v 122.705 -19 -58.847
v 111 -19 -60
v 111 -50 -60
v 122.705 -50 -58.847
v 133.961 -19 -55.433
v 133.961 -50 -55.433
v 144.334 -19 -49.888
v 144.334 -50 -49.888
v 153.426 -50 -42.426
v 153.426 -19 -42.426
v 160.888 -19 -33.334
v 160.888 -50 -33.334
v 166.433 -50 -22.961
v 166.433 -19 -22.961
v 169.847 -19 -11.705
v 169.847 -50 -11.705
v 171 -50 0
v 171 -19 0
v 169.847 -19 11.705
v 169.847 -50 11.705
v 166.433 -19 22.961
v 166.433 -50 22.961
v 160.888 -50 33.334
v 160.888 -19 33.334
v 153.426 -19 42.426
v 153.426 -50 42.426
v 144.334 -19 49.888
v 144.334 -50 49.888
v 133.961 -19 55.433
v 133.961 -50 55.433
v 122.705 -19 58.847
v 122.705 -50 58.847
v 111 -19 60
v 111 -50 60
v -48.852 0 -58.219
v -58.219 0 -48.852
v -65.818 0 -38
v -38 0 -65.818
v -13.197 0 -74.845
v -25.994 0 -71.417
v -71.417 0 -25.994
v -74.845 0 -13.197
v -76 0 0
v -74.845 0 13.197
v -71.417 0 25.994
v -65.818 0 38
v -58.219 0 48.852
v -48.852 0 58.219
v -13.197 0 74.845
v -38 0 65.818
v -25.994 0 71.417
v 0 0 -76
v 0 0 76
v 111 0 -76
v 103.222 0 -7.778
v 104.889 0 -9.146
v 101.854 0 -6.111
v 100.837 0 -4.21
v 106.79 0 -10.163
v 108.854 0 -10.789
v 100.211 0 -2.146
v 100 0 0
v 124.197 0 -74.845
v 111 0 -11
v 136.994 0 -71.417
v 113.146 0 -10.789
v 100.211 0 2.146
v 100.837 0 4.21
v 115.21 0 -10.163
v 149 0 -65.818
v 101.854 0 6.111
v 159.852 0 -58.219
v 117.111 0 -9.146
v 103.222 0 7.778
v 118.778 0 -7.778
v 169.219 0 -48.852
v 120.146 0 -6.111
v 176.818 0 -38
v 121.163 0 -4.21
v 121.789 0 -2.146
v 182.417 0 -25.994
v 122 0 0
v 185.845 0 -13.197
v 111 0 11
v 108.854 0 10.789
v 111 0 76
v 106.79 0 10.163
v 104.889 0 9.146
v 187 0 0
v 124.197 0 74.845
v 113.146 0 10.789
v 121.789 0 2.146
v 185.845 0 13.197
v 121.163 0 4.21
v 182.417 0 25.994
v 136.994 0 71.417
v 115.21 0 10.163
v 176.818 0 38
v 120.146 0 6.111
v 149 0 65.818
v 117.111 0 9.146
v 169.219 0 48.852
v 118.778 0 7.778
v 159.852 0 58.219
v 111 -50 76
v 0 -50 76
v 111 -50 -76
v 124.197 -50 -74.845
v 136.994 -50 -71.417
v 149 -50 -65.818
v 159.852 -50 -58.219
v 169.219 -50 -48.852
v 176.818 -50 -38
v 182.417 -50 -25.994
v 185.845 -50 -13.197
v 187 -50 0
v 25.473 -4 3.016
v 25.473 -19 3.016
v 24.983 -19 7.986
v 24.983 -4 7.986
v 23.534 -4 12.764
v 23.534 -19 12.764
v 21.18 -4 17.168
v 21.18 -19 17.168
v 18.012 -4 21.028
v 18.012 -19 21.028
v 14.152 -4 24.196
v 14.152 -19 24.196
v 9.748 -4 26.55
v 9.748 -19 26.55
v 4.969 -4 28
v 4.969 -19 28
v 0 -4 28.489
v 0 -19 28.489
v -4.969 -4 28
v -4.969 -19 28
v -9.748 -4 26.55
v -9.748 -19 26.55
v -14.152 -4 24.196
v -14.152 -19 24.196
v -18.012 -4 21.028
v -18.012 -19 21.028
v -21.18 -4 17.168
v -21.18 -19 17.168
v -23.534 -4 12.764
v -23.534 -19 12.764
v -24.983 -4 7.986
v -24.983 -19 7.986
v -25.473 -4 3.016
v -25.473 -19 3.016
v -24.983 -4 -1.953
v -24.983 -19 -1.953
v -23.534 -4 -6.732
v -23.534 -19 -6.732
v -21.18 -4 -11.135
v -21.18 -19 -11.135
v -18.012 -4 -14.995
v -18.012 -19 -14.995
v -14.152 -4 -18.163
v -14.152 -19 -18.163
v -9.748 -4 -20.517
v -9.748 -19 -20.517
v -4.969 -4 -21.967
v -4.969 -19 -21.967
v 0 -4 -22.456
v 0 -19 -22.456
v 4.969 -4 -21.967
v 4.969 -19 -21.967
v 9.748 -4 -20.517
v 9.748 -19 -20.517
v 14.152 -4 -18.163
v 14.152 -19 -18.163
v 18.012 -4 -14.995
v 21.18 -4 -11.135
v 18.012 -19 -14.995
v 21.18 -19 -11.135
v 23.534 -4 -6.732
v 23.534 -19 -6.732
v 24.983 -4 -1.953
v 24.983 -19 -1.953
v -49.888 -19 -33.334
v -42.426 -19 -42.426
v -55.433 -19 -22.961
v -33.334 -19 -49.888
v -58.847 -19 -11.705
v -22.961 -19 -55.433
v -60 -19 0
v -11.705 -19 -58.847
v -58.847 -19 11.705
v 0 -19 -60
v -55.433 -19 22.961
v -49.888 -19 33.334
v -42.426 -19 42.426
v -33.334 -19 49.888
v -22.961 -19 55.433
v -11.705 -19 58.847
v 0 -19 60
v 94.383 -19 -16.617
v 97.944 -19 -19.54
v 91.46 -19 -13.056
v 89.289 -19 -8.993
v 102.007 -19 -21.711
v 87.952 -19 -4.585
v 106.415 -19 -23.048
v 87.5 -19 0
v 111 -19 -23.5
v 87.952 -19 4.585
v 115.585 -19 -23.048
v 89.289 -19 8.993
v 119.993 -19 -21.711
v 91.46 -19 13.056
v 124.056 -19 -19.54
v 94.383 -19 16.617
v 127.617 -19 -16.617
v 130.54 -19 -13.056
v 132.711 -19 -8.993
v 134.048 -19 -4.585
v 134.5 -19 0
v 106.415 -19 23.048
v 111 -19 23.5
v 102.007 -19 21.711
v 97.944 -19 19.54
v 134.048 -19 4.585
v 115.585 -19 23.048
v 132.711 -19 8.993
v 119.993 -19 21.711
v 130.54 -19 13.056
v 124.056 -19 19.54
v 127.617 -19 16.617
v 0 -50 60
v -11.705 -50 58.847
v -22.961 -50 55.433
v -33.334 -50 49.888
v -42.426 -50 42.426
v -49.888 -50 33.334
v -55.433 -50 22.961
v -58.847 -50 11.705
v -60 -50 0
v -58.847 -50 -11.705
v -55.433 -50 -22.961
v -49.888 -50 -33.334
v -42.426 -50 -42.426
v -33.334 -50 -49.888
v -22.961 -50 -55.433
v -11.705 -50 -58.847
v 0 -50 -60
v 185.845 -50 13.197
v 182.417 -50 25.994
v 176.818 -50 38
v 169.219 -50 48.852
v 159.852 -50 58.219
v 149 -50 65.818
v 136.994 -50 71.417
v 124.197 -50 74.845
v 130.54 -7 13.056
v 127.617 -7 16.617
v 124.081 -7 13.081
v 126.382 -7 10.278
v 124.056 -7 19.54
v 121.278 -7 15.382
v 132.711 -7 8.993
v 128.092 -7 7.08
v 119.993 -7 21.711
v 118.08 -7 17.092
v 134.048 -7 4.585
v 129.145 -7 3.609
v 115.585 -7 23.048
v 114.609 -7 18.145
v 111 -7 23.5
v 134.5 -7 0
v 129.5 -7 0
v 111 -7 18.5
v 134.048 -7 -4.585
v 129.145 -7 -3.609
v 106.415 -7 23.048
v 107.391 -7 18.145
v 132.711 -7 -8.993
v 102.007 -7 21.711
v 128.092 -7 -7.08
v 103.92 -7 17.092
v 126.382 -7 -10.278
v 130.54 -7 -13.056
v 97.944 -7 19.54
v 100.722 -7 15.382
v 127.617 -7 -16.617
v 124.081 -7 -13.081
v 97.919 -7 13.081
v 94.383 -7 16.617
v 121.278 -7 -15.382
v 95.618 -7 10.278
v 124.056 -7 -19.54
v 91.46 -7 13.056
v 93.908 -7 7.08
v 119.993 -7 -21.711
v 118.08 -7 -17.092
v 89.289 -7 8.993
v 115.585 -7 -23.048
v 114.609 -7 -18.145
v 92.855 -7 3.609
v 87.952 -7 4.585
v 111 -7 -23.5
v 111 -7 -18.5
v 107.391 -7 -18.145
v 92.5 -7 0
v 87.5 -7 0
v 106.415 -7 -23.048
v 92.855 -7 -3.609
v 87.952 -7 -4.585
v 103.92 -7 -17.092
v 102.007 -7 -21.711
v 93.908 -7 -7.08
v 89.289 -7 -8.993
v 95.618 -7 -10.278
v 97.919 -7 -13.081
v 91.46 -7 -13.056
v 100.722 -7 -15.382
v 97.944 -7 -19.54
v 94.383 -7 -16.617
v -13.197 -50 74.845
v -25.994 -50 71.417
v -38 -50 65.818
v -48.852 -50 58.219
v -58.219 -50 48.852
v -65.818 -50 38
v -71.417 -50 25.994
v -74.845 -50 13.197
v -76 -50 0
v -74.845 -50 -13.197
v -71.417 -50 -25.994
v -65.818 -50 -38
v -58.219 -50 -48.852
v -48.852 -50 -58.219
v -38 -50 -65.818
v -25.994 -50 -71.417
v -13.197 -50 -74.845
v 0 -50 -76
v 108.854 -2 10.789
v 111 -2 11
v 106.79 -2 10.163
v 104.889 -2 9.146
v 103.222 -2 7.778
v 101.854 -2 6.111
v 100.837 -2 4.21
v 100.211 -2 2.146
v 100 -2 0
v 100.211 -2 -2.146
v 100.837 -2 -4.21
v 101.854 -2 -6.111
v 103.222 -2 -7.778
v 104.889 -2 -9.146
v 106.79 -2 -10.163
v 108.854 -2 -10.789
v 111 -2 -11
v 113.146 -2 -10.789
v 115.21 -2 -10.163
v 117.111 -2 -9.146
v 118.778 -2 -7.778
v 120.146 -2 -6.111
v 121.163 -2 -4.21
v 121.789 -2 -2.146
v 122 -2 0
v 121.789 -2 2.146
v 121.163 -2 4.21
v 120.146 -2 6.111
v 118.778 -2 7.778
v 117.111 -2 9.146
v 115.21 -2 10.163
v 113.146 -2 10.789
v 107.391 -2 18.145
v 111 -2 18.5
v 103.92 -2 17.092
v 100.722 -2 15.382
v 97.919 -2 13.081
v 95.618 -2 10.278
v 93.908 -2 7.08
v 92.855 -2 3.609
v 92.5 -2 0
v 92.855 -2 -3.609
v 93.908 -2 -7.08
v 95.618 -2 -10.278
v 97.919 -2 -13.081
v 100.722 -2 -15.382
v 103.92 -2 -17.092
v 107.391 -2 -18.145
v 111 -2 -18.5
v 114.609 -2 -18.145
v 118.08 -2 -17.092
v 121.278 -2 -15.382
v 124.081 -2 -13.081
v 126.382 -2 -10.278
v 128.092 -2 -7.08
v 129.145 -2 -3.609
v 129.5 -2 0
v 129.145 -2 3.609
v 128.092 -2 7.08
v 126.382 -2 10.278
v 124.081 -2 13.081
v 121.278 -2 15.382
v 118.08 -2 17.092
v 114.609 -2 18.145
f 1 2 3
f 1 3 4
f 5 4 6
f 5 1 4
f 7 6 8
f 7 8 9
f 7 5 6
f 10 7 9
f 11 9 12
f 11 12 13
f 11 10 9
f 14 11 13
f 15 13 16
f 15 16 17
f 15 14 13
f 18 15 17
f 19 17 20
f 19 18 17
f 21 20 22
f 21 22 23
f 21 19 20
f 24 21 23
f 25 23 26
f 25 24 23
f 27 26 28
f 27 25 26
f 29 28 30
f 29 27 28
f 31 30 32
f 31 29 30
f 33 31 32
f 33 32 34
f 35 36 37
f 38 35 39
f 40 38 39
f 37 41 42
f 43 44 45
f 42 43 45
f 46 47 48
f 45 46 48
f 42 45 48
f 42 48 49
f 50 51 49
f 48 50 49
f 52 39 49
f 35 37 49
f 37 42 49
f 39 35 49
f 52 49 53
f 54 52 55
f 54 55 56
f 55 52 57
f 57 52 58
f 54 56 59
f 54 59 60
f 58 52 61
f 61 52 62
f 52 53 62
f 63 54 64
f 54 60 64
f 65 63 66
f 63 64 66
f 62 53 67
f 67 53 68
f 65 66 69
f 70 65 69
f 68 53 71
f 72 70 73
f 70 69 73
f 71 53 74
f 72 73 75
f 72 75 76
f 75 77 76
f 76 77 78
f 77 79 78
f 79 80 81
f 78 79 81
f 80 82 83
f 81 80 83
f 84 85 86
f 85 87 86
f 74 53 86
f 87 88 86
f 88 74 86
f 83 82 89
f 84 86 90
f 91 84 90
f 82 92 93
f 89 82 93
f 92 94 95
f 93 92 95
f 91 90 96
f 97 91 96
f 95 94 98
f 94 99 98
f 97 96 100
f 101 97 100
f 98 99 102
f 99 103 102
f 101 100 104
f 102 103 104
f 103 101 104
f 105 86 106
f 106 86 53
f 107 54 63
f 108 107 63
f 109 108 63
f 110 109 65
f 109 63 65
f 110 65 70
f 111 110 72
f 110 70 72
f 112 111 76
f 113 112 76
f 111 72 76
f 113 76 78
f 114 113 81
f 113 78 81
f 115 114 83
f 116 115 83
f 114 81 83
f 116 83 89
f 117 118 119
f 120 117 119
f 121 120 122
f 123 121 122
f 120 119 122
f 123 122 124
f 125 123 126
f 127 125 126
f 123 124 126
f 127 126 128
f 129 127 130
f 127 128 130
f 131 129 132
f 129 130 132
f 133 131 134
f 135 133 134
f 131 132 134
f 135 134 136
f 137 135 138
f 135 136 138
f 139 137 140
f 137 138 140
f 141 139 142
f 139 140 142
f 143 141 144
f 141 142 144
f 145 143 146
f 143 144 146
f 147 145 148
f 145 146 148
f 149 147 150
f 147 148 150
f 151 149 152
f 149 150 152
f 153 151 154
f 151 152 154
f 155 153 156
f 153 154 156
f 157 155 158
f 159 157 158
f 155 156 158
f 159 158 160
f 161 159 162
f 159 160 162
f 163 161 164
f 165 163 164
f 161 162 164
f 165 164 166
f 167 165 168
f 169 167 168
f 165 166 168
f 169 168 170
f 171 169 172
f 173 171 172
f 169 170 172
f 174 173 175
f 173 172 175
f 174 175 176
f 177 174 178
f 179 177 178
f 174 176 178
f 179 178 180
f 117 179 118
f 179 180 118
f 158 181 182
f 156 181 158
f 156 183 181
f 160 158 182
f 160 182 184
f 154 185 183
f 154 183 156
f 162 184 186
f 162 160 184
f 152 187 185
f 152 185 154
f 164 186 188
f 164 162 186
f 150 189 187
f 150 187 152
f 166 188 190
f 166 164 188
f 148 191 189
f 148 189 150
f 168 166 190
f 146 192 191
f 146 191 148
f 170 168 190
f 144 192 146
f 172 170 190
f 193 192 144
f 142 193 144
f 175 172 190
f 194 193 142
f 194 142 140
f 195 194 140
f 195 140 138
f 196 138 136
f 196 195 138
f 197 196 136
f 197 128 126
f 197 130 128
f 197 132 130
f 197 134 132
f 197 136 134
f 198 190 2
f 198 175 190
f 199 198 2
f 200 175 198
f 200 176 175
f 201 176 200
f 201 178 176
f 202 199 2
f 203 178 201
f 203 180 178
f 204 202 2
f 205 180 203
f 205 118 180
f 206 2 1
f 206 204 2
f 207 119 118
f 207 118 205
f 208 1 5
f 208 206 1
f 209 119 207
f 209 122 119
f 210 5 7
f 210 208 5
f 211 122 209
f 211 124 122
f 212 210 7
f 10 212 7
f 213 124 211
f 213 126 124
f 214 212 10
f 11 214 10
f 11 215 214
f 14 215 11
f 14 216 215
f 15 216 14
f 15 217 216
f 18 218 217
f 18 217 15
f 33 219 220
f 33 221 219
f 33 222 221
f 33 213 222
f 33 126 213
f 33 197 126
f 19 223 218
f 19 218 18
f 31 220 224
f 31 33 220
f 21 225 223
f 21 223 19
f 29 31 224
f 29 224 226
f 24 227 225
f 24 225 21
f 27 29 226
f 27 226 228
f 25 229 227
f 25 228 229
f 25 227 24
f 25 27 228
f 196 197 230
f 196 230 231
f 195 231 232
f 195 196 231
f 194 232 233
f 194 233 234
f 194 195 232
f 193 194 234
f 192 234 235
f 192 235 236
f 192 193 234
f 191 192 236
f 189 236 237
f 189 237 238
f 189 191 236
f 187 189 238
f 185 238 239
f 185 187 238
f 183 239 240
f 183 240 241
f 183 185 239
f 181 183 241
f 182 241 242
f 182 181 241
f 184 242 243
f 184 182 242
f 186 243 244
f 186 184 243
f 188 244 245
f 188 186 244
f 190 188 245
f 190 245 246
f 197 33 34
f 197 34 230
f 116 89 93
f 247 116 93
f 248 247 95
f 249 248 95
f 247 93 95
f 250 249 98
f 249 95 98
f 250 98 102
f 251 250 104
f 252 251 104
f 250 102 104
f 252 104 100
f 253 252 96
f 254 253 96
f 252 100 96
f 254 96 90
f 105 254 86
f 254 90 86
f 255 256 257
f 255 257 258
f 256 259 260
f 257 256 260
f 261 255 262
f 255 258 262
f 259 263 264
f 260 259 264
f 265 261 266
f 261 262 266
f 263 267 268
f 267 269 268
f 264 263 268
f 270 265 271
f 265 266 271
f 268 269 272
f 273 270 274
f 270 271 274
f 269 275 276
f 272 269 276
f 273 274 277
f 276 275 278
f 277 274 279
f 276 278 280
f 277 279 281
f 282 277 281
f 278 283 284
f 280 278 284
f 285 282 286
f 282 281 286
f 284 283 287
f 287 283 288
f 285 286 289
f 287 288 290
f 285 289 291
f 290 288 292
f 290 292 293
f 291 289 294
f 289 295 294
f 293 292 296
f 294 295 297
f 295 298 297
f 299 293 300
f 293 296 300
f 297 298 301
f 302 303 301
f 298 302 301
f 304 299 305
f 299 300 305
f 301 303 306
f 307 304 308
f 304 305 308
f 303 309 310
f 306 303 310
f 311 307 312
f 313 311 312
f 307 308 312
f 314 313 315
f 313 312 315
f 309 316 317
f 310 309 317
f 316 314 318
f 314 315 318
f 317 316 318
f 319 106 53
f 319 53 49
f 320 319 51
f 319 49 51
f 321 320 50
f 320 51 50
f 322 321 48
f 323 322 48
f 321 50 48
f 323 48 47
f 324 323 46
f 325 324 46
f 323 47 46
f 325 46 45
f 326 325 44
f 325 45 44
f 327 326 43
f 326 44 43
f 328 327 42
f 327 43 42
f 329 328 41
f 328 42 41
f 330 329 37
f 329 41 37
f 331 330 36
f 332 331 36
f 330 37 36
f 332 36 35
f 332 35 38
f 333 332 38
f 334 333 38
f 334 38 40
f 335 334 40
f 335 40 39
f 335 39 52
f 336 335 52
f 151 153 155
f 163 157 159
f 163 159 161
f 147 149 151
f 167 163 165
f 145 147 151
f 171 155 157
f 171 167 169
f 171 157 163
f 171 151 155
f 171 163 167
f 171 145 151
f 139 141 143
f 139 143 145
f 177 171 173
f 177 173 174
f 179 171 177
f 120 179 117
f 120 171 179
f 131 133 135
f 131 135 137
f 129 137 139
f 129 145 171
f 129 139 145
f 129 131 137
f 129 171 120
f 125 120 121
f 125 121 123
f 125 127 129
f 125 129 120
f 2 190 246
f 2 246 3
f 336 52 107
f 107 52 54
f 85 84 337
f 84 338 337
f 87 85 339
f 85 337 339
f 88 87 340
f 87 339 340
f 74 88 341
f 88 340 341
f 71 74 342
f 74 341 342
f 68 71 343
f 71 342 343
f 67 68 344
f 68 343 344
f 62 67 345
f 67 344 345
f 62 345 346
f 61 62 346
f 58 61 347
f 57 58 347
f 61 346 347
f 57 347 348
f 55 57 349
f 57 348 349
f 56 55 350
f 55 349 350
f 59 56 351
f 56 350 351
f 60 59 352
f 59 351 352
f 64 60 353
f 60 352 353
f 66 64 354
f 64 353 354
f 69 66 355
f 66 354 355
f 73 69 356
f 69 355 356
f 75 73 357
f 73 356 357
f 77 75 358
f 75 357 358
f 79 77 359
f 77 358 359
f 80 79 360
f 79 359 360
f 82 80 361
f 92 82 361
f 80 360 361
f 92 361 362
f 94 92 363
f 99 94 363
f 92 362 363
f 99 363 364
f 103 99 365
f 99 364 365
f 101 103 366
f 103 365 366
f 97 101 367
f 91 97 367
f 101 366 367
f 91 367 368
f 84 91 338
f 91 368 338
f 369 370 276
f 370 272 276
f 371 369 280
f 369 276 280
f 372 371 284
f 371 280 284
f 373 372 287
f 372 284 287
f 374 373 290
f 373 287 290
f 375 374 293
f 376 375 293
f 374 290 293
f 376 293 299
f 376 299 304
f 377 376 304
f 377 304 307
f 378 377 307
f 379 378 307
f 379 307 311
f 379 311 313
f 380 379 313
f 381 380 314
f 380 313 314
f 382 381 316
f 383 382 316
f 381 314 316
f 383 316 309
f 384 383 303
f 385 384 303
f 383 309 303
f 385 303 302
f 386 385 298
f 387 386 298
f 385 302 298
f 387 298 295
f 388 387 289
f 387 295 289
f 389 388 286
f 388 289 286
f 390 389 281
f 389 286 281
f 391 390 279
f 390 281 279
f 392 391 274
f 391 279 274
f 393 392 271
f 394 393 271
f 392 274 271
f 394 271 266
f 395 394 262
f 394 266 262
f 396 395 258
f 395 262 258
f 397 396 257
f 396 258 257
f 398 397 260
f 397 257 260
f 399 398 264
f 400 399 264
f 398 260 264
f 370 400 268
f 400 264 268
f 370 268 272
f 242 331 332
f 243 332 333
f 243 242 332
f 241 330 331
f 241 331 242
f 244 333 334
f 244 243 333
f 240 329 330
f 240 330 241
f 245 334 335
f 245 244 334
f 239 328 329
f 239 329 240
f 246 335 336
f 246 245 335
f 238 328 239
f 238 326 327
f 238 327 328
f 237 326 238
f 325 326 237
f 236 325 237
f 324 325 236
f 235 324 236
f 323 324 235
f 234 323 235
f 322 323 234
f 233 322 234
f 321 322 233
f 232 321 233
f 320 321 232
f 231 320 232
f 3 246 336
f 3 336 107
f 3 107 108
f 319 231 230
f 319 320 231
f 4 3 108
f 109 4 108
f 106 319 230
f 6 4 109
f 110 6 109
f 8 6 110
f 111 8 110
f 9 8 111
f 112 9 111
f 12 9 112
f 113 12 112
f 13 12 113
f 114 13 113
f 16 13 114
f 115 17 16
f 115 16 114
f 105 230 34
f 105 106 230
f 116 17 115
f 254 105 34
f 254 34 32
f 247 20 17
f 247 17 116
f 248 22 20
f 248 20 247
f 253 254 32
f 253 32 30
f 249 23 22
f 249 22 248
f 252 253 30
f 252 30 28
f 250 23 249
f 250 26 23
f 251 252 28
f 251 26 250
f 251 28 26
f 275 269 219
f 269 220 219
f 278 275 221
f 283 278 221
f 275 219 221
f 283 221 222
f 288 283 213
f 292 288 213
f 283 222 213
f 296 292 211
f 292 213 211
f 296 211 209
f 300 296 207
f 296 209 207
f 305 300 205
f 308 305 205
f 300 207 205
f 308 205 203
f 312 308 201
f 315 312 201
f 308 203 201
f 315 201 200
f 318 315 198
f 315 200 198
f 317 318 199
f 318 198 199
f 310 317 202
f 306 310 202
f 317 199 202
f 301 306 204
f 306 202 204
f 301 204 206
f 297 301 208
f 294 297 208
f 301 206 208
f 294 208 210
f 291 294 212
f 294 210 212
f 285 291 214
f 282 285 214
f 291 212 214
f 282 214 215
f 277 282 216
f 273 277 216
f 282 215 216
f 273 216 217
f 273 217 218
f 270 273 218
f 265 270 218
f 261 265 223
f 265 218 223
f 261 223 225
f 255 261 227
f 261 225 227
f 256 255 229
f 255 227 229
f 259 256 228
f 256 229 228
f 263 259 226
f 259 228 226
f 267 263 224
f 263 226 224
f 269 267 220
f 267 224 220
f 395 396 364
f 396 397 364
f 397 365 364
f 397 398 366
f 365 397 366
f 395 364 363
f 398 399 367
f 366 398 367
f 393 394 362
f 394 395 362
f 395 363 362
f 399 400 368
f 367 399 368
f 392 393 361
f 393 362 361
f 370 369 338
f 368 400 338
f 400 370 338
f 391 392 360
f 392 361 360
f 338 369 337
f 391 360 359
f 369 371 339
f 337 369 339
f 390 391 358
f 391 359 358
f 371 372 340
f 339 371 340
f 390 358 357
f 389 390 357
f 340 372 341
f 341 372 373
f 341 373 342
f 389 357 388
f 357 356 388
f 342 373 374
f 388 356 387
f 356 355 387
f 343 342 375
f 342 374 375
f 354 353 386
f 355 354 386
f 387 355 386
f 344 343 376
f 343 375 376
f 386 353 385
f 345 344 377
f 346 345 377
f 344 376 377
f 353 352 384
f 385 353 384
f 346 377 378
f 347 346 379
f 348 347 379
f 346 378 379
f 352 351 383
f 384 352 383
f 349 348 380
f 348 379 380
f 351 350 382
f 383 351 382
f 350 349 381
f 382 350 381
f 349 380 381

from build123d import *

# Parameters (mm, degrees)
F1_DEPTH = 50
F4_DEPTH = 31
F5_DEPTH = 31
F6_R     = 25.4726369524
F7_DEPTH = 15


with BuildPart() as f1:
    # F0 (on Front) → F1 (new body)
    with BuildSketch(Plane.XZ):
        with BuildLine():
            Line((111, 76), (0, 76))
            ThreePointArc((0, 76), (30.2492433933, 69.7207521053), (55.5, 51.9206124771))
            ThreePointArc((55.5, 51.9206124771), (80.7507566067, 69.7207521053), (111, 76))
        make_face()
        with BuildLine():
            ThreePointArc((55.5, 51.9206124771), (30.2492433933, 69.7207521053), (0, 76))
            ThreePointArc((0, 76), (-76, 0), (0, -76))
            ThreePointArc((0, -76), (30.2492433933, -69.7207521053), (55.5, -51.9206124771))
            ThreePointArc((55.5, -51.9206124771), (35, 0), (55.5, 51.9206124771))
        make_face()
        with BuildLine():
            ThreePointArc((76, 0), (70.6894617323, 27.9105714739), (55.5, 51.9206124771))
            ThreePointArc((55.5, 51.9206124771), (35, 0), (55.5, -51.9206124771))
            ThreePointArc((55.5, -51.9206124771), (70.6894617323, -27.9105714739), (76, 0))
        make_face()
        with BuildLine():
            ThreePointArc((111, 76), (80.7507566067, 69.7207521053), (55.5, 51.9206124771))
            ThreePointArc((55.5, 51.9206124771), (70.6894617323, 27.9105714739), (76, 0))
            ThreePointArc((76, 0), (70.6894617323, -27.9105714739), (55.5, -51.9206124771))
            ThreePointArc((55.5, -51.9206124771), (80.7507566067, -69.7207521053), (111, -76))
            ThreePointArc((111, -76), (164.7401153702, -53.7401153702), (187, 0))
            ThreePointArc((187, 0), (164.7401153702, 53.7401153702), (111, 76))
        make_face()
        with BuildLine():
            ThreePointArc((55.5, -51.9206124771), (30.2492433933, -69.7207521053), (0, -76))
            Line((0, -76), (111, -76))
            ThreePointArc((111, -76), (80.7507566067, -69.7207521053), (55.5, -51.9206124771))
        make_face()
    extrude(amount=F1_DEPTH)

    # F3 (on offset) → F4 (cut)
    with BuildSketch(Plane.XZ.offset(19)):
        with BuildLine():
            ThreePointArc((55.5, 22.7980262304), (33.407472414, 49.8391491391), (0, 60))
            ThreePointArc((0, 60), (-60, 0), (0, -60))
            ThreePointArc((0, -60), (33.407472414, -49.8391491391), (55.5, -22.7980262304))
            ThreePointArc((55.5, -22.7980262304), (51, 0), (55.5, 22.7980262304))
        make_face()
        with BuildLine():
            Line((111, 60), (0, 60))
            ThreePointArc((0, 60), (33.407472414, 49.8391491391), (55.5, 22.7980262304))
            ThreePointArc((55.5, 22.7980262304), (77.592527586, 49.8391491391), (111, 60))
        make_face()
        with BuildLine():
            ThreePointArc((55.5, -22.7980262304), (33.407472414, -49.8391491391), (0, -60))
            Line((0, -60), (111, -60))
            ThreePointArc((111, -60), (77.592527586, -49.8391491391), (55.5, -22.7980262304))
        make_face()
        with BuildLine():
            ThreePointArc((111, 60), (77.592527586, 49.8391491391), (55.5, 22.7980262304))
            ThreePointArc((55.5, 22.7980262304), (58.864250611, 11.6189500386), (60, 0))
            ThreePointArc((60, 0), (58.864250611, -11.6189500386), (55.5, -22.7980262304))
            ThreePointArc((55.5, -22.7980262304), (77.592527586, -49.8391491391), (111, -60))
            ThreePointArc((111, -60), (153.4264068712, -42.4264068712), (171, 0))
            ThreePointArc((171, 0), (153.4264068712, 42.4264068712), (111, 60))
        make_face()
    extrude(amount=F4_DEPTH, mode=Mode.SUBTRACT)

    # F5 (cut): a face of the model
    f5_faces = [f1.faces().sort_by_distance(p)[0] for p in [
        (55.5, -50, 0),
    ]]
    extrude(f5_faces, amount=-F5_DEPTH, mode=Mode.SUBTRACT)

    # F6 (on offset) → F7 (cut)
    with BuildSketch(Plane.XZ.offset(19)):
        with Locations((0, 3.0164269265)):
            Circle(F6_R)
    extrude(amount=-F7_DEPTH, mode=Mode.SUBTRACT)

    # F9 (on offset) → F10 (revolve, cut)
    with BuildSketch(Plane.YZ.offset(111)):
        Polygon((-19, 0), (0, 0), (0, 11), (-2, 11), (-2, 18.5), (-7, 18.5), (-7, 23.5), (-19, 23.5), align=None)
    revolve(axis=Axis((111, -12.6816760749, 0), (0, -1, 0)), mode=Mode.SUBTRACT)


solid = f1.part
